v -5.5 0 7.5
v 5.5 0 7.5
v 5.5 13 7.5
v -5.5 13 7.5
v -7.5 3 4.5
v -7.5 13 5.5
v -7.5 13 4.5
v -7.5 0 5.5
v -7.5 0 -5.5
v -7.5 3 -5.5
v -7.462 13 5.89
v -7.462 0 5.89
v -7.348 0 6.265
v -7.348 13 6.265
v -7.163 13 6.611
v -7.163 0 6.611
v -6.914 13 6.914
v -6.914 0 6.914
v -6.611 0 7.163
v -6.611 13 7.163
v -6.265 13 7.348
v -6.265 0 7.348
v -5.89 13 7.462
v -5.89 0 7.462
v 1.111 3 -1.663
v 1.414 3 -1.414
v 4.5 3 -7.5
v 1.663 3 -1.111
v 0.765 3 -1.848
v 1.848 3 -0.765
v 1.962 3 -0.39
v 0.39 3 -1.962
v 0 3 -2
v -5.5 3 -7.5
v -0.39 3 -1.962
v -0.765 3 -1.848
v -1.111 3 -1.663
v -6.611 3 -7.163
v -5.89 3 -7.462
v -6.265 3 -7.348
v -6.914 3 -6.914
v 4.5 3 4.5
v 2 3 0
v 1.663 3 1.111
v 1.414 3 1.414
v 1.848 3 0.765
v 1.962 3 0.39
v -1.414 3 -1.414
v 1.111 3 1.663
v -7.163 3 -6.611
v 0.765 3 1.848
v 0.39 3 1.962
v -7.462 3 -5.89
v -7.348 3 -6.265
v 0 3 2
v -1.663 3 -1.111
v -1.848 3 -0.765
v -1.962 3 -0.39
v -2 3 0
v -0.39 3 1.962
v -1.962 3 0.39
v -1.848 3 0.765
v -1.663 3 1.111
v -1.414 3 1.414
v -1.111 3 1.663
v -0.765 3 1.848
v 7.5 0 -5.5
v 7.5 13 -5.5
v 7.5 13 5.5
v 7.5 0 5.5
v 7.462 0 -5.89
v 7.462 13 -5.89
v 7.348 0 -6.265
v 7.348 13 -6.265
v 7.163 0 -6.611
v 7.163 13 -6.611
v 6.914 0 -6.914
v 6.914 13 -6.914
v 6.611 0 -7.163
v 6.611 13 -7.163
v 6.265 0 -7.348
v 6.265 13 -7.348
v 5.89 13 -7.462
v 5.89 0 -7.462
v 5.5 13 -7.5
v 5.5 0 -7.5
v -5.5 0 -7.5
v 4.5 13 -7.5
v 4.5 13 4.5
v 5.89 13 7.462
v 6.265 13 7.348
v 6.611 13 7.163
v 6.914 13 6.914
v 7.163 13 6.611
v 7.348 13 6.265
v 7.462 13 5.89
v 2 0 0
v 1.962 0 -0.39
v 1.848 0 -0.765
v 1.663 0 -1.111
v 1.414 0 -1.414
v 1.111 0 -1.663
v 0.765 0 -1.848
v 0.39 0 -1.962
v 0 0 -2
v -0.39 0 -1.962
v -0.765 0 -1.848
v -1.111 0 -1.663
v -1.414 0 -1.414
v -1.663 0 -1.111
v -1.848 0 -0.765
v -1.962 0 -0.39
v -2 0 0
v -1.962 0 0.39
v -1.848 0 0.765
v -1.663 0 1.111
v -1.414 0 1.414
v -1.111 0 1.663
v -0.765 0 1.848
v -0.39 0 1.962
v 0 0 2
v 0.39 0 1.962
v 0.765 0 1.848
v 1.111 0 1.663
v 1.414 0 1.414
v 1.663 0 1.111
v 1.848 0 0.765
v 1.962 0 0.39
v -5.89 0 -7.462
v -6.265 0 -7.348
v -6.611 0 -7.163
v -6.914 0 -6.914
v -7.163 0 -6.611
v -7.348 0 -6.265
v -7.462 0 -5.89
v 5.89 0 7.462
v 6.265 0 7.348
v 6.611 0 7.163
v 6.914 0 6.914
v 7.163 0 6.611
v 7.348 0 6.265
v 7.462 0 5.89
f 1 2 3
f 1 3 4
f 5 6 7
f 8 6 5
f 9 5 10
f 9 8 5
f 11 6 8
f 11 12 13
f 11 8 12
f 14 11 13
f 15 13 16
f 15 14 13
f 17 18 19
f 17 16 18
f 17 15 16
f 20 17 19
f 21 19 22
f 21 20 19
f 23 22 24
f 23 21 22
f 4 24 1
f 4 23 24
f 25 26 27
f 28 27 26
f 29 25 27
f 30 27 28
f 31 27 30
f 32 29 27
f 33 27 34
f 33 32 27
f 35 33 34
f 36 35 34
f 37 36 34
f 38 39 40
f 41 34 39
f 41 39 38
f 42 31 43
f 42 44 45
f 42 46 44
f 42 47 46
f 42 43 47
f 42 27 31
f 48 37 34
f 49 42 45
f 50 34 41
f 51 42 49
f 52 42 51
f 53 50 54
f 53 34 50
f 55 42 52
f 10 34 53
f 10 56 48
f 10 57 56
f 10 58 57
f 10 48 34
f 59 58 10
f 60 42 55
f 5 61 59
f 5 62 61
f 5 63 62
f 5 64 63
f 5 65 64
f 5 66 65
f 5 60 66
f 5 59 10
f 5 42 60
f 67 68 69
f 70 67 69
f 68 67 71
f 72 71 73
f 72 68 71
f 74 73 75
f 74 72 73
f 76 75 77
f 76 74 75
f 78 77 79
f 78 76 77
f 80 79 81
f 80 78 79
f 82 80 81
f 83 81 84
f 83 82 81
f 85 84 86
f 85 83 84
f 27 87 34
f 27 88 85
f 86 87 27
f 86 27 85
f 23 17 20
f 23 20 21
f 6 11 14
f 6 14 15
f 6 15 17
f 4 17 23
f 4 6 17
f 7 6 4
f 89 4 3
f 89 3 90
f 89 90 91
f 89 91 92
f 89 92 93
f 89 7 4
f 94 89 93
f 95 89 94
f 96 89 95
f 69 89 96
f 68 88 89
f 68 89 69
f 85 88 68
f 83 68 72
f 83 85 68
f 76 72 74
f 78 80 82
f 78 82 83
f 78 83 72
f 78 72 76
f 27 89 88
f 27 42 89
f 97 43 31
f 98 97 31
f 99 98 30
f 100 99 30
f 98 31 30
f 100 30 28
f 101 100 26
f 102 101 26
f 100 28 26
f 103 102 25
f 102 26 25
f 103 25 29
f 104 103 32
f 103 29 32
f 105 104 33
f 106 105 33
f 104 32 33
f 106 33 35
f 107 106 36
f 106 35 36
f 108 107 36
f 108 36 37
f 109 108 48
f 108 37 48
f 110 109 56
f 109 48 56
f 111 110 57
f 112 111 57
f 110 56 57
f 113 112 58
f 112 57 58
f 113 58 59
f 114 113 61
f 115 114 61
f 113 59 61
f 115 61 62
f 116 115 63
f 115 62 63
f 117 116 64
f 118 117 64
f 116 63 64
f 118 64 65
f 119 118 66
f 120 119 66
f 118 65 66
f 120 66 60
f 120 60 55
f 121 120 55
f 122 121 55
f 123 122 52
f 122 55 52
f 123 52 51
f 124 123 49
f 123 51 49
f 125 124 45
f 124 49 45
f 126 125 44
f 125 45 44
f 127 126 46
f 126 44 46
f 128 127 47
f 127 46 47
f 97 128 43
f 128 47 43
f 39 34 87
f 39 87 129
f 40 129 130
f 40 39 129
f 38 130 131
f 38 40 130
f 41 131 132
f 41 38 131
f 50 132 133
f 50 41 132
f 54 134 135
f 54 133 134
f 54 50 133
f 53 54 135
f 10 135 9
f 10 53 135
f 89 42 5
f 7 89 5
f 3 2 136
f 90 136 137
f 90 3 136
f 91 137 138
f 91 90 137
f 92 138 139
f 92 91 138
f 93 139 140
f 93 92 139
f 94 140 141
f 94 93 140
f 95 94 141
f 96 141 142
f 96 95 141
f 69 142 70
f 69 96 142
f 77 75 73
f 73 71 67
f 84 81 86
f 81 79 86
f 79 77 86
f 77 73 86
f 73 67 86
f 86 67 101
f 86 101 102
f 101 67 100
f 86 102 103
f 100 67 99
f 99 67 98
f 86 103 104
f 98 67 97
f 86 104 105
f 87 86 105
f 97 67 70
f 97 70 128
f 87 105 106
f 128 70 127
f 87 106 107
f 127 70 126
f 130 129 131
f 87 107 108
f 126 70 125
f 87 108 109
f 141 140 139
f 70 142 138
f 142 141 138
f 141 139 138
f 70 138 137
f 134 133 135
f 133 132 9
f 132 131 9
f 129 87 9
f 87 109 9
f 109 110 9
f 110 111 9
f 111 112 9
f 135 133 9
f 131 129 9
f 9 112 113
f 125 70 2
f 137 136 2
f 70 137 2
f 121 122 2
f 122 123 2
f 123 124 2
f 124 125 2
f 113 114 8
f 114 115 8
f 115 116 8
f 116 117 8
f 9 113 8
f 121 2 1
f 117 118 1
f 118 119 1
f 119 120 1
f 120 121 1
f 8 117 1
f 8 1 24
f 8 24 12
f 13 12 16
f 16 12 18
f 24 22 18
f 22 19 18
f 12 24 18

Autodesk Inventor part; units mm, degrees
ref_plane "YZ Plane" through (0, 0, 0) normal (1, 0, 0) x (0, 1, 0)
ref_plane "XZ Plane" through (0, 0, 0) normal (0, 1, 0) x (-1, 0, 0)
ref_plane "XY Plane" through (0, 0, 0) normal (0, 0, 1) x (1, 0, 0)
sketch "Sketch1" plane through (0, 0, 0) normal (0, 1, 0) x (-1, 0, 0)
  line L0 (0, 0) -> (0, 7.5)
  line L1 (0, 7.5) -> (7.5, 7.5)
  line L2 (7.5, 7.5) -> (7.5, -7.5)
  line L3 (7.5, -7.5) -> (-7.5, -7.5)
  line L4 (-7.5, -7.5) -> (-7.5, 7.5)
  line L5 (-7.5, 7.5) -> (0, 7.5)
  dimension "d0" = 7.5
  dimension "d1" = 7.5
  dimension "d2" = 15
  dimension "d3" = 15
extrude "Extrusion1" add sketch "Sketch1" along normal blind 3
fillet "Fillet1" radius 2 4 edges at (7.5, 1.5, 7.5) (7.5, 1.5, -7.5) (-7.5, 1.5, 7.5) (-7.5, 1.5, -7.5)
sketch "Sketch2" plane through (0, 3, 0) normal (0, 1, 0) x (1, 0, 0)
  circle A0 centre (0, 0) radius 2
  dimension "d7" = 4
extrude "Extrusion2" cut sketch "Sketch2" against normal blind 3
sketch "Sketch3" plane through (0, 3, 0) normal (0, 1, 0) x (1, 0, 0)
  line L0 (0, 0) -> (7.5, 0)
  line L1 (7.5, -5.5) -> (7.5, 5.5) projected
  line L2 (7.5, 0) -> (4.5, 0)
  line L3 (4.5, 0) -> (4.5, 4.5)
  line L4 (4.5, 4.5) -> (4.5, -4.5)
  line L5 (4.5, -4.5) -> (-4.5, -4.5)
  line L6 (-4.5, -4.5) -> (-7.5, -4.5)
  line L7 (-7.5, 5.5) -> (-7.5, -5.5) projected
  line L8 (4.5, 4.5) -> (4.5, 7.5)
  line L9 (5.5, 7.5) -> (-5.5, 7.5) projected
  line L10 (4.5, 7.5) -> (5.5, 7.5)
  line L11 (7.5, 5.5) -> (7.5, -5.5)
  line L12 (-5.5, -7.5) -> (5.5, -7.5) projected
  line L13 (5.5, -7.5) -> (-5.5, -7.5)
  arc A0 (7.5, 5.5) -> (5.5, 7.5) centre (5.5, 5.5) ccw projected
  arc A1 (7.5, 5.5) -> (5.5, 7.5) centre (5.5, 5.5) ccw
  arc A2 (5.5, -7.5) -> (7.5, -5.5) centre (5.5, -5.5) ccw projected
  arc A3 (5.5, -7.5) -> (7.5, -5.5) centre (5.5, -5.5) ccw
  line L14 (-7.5, -4.5) -> (-7.5, -5.5)
  arc A4 (-7.5, -5.5) -> (-5.5, -7.5) centre (-5.5, -5.5) ccw projected
  arc A5 (-7.5, -5.5) -> (-5.5, -7.5) centre (-5.5, -5.5) ccw
  dimension "d10" = 3
  dimension "d11" = 4.5
  dimension "d12" = 9
  dimension "d13" = 9
  dimension "d14" = 3
extrude "Extrusion3" add sketch "Sketch3" along normal blind 10
properties part number "legs"
